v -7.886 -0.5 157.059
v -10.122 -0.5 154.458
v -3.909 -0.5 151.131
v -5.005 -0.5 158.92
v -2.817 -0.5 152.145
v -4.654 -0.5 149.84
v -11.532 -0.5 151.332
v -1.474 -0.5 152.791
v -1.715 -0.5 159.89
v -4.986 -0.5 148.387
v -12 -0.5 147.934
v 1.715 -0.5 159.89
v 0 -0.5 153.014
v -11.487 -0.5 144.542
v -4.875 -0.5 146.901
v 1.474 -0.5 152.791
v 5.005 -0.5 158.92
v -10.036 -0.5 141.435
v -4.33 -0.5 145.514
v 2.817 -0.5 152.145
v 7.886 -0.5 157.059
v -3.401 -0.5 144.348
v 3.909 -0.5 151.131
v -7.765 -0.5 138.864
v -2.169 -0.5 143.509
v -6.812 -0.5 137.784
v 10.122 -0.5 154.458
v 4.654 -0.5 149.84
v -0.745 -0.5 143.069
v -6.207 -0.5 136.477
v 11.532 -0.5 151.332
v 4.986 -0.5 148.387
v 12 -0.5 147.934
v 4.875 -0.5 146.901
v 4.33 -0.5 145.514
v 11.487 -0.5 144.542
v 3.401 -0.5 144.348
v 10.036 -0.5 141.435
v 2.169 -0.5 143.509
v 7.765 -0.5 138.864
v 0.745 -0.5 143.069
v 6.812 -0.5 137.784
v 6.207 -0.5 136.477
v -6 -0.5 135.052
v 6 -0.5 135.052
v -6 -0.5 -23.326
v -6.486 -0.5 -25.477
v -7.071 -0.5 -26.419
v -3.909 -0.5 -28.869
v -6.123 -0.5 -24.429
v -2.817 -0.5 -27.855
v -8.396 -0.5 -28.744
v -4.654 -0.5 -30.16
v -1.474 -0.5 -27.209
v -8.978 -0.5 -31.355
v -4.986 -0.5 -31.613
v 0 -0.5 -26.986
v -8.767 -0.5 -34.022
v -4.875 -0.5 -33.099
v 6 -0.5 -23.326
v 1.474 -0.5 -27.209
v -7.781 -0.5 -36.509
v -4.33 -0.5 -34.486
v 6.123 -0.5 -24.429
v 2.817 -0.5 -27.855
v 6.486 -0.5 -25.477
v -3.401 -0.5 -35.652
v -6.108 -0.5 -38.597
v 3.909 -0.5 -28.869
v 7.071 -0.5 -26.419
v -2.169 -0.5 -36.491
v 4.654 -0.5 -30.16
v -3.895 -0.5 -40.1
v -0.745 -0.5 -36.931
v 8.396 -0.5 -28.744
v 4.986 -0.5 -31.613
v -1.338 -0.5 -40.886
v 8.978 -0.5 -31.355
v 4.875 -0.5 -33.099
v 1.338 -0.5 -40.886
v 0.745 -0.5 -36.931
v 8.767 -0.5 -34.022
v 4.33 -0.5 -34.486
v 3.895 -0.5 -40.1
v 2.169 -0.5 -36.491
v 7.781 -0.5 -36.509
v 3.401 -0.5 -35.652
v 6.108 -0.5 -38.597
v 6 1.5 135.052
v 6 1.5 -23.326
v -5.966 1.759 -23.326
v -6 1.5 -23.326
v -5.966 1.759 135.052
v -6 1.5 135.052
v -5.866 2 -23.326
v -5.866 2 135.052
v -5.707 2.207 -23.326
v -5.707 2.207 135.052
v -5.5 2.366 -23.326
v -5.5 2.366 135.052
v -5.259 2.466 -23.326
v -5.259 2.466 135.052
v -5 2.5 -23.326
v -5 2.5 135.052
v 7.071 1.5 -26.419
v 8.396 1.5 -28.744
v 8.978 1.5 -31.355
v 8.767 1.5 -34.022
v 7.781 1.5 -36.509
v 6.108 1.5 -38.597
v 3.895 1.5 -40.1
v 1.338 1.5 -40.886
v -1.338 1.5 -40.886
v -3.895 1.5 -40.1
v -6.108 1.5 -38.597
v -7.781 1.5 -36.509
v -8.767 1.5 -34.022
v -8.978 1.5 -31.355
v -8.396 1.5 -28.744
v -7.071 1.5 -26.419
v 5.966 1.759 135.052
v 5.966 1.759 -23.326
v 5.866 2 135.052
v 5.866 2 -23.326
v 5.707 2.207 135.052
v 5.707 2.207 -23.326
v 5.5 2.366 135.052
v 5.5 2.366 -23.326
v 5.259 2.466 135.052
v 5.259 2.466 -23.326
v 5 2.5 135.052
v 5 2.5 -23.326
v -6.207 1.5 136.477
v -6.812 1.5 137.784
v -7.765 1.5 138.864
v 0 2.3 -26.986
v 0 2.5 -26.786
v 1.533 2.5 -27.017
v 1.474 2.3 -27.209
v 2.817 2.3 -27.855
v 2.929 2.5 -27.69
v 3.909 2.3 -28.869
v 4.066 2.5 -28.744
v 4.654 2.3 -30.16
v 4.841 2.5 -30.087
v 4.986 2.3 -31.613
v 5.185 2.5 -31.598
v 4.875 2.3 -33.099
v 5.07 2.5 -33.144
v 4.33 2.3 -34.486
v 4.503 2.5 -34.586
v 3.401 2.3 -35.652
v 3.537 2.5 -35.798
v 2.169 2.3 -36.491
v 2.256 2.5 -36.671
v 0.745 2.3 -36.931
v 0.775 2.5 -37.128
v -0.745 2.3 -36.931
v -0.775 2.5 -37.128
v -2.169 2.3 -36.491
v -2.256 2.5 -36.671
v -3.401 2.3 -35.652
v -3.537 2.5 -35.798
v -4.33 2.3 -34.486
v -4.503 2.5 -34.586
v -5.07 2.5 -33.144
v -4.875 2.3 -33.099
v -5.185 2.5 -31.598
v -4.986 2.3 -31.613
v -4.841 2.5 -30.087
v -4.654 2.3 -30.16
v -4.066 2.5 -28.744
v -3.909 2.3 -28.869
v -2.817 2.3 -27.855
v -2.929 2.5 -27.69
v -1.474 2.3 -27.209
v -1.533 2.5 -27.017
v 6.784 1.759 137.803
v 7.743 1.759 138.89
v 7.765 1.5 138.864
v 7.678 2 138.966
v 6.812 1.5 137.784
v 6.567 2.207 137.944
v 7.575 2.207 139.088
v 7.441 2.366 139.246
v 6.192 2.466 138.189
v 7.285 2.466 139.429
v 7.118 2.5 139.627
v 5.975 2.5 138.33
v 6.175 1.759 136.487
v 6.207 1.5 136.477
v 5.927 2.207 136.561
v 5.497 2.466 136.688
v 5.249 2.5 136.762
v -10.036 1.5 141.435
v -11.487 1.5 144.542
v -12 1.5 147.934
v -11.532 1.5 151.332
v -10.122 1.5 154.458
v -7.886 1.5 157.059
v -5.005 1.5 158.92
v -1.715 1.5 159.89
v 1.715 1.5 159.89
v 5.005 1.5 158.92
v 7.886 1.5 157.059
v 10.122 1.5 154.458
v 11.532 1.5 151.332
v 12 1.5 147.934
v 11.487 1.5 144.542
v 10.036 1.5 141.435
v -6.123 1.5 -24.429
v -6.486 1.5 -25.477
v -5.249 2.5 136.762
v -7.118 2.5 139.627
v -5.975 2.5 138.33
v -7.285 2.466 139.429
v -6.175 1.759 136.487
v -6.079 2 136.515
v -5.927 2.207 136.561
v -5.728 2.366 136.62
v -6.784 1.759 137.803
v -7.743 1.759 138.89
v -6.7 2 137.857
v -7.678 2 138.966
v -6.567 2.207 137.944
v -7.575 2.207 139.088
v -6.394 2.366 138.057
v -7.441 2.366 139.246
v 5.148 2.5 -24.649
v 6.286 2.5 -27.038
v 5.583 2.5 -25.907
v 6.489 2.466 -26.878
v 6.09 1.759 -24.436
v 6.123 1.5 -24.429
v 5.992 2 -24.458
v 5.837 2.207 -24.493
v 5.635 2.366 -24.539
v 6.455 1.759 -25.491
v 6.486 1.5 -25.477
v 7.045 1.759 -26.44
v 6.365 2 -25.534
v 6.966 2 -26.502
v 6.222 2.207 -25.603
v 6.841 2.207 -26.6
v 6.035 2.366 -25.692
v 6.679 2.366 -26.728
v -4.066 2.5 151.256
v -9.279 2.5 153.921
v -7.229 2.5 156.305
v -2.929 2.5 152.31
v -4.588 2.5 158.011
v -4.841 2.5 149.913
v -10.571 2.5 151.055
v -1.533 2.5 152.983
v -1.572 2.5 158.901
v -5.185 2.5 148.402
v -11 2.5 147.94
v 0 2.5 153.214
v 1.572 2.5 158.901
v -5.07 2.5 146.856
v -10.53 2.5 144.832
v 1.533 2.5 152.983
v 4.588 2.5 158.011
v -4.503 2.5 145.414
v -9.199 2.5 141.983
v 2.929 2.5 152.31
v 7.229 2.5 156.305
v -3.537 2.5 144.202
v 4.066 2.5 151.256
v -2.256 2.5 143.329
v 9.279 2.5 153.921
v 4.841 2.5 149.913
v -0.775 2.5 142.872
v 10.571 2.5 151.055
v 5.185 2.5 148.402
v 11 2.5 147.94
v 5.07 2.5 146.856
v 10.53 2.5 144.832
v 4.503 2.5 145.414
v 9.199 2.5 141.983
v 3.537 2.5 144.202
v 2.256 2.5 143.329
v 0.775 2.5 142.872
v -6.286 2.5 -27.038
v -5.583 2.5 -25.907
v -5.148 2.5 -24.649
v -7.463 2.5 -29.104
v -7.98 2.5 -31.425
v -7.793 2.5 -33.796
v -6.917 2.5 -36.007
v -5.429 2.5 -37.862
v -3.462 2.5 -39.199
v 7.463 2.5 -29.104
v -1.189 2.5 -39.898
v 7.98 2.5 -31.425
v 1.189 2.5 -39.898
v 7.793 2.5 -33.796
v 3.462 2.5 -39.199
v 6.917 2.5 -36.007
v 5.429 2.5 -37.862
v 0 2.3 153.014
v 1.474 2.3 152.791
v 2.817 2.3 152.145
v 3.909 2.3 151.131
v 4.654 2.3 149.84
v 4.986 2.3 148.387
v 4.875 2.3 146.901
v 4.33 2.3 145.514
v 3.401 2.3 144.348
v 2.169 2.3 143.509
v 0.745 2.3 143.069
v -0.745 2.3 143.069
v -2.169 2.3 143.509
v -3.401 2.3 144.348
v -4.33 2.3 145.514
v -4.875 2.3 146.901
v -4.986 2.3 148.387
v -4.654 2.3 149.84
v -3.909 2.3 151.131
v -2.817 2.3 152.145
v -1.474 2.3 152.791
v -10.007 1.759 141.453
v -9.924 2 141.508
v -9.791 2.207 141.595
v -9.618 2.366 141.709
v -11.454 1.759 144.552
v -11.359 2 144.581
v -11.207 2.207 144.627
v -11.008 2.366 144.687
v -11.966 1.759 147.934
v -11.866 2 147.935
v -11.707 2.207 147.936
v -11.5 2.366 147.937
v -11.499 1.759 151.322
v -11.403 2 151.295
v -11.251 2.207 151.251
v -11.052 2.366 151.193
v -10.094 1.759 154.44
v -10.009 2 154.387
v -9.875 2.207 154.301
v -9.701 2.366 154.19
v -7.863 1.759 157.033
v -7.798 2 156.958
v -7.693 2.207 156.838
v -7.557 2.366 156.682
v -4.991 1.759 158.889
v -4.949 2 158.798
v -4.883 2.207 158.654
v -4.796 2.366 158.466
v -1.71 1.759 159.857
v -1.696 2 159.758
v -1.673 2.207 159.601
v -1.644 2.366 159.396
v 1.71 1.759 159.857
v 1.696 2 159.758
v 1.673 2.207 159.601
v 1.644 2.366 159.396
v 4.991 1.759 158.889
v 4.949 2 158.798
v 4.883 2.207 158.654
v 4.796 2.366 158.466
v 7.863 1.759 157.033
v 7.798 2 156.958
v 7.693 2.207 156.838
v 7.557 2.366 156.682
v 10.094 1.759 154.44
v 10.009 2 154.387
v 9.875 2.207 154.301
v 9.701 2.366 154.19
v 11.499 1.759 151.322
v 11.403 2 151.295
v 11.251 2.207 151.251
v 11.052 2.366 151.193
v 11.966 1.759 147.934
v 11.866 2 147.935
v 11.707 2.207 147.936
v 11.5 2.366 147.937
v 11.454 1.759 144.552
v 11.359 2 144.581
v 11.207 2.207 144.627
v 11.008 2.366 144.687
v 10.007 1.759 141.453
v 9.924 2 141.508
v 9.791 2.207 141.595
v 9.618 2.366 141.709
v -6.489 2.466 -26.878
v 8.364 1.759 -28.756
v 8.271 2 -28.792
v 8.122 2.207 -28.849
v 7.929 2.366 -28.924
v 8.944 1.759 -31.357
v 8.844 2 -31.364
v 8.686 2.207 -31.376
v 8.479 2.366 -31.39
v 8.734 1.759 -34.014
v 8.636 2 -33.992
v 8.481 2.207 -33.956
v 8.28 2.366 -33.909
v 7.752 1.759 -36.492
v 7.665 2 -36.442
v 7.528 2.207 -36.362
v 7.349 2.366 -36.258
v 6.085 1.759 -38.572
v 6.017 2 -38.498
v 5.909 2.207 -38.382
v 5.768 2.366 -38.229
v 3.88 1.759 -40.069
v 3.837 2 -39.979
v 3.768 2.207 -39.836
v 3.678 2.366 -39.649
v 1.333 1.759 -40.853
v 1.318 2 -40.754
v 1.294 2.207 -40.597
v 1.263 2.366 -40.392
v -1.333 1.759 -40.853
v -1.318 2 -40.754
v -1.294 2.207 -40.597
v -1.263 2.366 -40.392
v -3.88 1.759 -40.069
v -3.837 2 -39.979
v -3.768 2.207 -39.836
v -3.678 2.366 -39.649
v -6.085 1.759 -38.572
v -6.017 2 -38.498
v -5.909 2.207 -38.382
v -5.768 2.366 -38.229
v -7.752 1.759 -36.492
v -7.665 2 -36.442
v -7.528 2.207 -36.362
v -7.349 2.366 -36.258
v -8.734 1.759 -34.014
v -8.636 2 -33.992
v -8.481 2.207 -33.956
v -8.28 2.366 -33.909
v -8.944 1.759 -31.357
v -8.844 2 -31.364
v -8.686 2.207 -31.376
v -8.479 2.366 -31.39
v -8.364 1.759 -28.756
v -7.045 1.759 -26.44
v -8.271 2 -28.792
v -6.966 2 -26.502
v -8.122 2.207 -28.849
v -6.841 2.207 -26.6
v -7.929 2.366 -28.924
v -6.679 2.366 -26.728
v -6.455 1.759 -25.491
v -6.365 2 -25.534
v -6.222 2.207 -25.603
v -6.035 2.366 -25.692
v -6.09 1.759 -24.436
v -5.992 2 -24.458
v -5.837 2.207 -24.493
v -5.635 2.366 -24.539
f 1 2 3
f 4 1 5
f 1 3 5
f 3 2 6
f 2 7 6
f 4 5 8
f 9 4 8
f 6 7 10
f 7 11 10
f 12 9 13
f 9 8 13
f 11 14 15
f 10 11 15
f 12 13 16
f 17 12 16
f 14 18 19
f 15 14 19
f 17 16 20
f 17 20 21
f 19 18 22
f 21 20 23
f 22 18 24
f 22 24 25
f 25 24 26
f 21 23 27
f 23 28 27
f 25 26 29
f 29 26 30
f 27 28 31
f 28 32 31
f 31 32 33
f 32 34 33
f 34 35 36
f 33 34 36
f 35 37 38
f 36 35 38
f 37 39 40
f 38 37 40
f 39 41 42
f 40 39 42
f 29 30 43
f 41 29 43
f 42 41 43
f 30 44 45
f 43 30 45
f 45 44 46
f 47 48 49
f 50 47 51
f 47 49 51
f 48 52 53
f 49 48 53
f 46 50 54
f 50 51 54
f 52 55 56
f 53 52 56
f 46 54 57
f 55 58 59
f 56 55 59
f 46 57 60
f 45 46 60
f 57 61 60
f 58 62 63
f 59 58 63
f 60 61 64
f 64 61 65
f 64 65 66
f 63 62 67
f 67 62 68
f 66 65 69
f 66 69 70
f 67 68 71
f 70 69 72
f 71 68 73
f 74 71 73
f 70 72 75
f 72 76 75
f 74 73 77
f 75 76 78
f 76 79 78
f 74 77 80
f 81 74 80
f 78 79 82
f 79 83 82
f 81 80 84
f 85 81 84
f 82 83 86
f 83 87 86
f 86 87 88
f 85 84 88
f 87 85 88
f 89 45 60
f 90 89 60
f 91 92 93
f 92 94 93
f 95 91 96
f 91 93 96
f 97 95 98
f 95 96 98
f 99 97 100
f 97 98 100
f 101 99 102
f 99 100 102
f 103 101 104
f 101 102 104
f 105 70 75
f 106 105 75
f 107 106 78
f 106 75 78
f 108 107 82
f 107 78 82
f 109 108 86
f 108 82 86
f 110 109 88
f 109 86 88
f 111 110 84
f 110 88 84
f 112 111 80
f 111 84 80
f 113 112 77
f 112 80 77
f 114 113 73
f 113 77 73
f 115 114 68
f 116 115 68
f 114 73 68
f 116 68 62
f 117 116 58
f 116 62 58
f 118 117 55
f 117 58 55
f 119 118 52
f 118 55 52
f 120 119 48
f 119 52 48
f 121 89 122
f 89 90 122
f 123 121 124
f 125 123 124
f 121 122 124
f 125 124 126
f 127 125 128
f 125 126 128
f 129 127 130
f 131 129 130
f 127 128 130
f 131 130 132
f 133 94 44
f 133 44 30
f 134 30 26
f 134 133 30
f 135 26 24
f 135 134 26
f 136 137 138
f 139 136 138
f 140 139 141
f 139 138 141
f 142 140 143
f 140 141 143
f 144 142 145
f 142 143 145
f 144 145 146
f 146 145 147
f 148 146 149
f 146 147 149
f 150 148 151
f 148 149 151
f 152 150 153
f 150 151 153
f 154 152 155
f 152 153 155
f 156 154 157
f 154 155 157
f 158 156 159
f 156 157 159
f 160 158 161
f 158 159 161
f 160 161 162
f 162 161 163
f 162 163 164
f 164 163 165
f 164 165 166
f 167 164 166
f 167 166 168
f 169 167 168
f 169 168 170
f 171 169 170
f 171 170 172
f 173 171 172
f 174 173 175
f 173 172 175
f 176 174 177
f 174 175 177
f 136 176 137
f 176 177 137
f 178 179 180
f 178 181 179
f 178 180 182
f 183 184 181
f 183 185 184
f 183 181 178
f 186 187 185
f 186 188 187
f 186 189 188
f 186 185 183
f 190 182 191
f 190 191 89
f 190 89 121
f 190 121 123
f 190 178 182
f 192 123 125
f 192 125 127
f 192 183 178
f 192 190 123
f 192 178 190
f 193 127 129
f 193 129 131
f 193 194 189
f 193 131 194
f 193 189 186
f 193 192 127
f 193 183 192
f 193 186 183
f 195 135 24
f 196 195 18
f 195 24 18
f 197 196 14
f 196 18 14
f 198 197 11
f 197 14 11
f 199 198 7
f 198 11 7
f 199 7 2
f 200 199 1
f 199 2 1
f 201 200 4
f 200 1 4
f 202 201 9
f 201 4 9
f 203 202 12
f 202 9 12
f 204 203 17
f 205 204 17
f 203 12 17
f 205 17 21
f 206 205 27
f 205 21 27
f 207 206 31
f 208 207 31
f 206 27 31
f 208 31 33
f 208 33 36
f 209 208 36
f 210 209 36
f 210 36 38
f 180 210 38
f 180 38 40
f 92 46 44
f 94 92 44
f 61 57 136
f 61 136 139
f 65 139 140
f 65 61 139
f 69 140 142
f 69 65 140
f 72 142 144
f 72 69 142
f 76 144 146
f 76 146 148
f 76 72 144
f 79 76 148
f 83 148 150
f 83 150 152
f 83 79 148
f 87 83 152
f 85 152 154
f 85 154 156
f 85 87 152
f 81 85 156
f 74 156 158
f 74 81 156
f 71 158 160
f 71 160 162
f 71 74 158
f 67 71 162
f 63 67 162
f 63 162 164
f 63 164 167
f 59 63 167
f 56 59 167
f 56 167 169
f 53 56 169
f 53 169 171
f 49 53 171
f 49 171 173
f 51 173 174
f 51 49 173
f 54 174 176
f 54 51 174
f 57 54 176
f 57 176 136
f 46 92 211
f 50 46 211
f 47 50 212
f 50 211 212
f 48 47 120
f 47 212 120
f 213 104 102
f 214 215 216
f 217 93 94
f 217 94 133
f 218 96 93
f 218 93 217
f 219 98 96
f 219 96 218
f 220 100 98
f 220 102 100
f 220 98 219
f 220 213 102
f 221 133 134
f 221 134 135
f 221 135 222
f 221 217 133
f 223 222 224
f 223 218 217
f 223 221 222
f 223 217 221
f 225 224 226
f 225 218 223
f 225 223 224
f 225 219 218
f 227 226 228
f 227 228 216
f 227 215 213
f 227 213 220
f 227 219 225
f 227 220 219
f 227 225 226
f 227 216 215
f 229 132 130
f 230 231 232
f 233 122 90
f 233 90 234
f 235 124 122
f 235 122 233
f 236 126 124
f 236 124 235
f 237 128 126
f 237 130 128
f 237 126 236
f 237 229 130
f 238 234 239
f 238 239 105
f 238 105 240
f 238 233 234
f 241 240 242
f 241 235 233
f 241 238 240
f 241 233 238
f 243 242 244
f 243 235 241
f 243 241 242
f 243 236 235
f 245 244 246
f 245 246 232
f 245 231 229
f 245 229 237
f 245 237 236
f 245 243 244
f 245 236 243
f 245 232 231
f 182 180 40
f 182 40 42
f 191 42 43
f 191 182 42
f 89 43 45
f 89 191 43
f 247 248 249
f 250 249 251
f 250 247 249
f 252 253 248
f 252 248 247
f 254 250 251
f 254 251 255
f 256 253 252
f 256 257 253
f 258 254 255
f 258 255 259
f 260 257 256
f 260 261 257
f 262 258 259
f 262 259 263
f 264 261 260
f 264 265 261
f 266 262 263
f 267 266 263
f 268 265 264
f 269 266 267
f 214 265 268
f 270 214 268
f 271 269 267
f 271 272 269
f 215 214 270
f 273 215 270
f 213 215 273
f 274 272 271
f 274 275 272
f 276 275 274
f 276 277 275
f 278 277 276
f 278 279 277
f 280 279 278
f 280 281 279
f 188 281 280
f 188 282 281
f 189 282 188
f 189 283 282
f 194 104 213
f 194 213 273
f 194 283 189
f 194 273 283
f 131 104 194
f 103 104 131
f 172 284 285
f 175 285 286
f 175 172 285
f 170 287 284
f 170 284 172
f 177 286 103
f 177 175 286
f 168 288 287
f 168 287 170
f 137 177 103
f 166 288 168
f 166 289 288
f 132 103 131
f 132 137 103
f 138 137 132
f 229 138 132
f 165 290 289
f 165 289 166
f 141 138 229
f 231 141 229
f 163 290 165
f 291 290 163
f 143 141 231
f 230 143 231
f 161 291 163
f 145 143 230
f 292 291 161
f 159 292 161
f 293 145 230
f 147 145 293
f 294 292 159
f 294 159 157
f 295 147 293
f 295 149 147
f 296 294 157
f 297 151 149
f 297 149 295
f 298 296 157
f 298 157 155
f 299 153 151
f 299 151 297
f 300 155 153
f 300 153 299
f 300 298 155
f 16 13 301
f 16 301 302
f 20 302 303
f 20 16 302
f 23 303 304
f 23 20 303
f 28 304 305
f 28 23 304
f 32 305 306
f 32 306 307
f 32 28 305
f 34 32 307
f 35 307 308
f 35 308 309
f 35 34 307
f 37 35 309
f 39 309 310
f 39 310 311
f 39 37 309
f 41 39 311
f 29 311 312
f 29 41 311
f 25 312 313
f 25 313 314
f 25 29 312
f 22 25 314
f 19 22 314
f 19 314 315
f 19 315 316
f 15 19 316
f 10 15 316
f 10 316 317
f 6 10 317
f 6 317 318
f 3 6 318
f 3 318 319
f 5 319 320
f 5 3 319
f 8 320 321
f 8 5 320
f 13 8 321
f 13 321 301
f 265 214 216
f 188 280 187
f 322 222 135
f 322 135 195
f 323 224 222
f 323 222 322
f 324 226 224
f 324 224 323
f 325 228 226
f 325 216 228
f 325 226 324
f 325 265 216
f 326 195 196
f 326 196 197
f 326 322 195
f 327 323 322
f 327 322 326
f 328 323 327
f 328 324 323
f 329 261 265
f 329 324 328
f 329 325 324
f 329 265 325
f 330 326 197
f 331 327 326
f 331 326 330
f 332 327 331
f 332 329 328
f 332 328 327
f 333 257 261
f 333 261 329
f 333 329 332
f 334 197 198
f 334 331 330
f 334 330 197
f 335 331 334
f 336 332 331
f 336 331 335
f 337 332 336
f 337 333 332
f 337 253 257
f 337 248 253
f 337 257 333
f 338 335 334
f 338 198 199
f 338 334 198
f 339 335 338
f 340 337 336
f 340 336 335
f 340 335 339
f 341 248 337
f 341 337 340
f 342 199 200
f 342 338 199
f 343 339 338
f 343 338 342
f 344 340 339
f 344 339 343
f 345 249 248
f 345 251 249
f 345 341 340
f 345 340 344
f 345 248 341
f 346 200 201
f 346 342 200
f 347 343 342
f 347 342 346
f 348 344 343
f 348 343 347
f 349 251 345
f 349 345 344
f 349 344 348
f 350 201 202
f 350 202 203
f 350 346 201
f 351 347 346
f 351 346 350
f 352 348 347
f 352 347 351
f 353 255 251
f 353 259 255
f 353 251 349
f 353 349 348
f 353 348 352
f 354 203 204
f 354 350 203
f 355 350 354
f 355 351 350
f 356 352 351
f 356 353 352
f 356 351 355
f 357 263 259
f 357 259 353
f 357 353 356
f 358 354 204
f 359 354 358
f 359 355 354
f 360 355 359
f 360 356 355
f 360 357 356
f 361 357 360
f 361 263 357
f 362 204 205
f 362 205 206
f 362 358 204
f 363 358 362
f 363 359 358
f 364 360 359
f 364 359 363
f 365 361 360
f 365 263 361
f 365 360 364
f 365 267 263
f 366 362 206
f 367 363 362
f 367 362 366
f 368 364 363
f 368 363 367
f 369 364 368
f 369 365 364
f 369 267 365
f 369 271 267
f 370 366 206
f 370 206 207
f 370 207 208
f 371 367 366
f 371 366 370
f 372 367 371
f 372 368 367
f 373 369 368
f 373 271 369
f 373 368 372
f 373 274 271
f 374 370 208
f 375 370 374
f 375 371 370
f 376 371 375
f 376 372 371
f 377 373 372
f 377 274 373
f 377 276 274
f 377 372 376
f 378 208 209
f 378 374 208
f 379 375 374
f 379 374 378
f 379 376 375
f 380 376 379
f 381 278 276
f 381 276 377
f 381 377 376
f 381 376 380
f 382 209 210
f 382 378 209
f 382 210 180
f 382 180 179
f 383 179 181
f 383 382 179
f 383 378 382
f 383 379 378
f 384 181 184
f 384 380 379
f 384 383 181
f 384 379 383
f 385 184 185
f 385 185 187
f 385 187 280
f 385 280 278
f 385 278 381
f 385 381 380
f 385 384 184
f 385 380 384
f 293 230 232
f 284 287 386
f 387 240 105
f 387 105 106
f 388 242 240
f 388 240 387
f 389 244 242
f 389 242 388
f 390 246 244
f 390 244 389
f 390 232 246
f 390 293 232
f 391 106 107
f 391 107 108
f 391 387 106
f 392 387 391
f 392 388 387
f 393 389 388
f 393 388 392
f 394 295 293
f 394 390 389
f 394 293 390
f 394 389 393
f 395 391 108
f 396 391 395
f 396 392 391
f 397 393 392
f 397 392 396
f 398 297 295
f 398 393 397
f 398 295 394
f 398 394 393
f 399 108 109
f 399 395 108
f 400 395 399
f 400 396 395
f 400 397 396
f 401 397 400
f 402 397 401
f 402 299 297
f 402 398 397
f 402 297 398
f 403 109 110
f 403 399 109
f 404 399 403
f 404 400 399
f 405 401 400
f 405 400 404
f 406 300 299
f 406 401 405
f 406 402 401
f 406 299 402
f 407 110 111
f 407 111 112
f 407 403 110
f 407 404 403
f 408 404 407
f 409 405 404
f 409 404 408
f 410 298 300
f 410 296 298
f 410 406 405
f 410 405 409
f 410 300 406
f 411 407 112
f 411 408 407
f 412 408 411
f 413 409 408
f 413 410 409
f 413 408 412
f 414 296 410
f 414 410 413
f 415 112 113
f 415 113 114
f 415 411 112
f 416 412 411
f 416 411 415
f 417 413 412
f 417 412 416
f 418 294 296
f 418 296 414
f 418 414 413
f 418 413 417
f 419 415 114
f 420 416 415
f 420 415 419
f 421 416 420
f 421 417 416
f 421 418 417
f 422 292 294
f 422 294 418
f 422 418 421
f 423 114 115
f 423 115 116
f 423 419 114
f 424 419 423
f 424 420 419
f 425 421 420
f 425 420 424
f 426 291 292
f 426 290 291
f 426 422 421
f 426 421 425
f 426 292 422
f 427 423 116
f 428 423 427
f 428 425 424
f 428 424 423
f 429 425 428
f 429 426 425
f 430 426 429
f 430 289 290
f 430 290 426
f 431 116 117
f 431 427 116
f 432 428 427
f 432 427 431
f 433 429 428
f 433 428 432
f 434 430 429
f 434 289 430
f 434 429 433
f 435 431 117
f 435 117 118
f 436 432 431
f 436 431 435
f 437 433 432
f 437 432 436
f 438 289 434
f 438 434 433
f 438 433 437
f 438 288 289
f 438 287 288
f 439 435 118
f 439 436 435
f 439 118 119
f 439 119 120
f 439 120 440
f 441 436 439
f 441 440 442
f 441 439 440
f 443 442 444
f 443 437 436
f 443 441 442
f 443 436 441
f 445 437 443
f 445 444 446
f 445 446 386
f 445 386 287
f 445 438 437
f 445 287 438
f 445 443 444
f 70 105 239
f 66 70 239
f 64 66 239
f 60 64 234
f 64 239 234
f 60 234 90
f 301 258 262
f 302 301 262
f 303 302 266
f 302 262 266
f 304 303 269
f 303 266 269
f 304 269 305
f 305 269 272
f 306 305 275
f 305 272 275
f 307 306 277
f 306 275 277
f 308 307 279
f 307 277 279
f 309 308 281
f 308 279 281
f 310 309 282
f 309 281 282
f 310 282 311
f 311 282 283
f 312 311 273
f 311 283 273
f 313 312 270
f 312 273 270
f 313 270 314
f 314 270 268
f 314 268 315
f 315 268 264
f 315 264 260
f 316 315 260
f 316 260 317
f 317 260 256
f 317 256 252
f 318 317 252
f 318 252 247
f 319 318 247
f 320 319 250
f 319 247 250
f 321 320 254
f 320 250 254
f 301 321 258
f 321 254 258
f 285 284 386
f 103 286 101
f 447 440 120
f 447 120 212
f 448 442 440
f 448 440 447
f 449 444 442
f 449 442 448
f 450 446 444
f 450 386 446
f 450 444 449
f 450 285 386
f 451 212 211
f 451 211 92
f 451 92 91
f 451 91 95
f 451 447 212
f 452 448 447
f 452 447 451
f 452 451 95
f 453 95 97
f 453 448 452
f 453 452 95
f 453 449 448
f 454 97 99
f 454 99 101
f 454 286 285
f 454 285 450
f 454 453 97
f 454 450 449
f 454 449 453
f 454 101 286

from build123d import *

# Parameters (mm, degrees)
SKETCH_1_R      = 3.333333333
EXTRUDE_1_DEPTH = 2
SCALE_1_SCALE   = 1.5
CHAMFER_1_SIZE  = 0.2
FILLET_1_R      = 5
FILLET_2_R      = 1


with BuildPart() as part:
    # 草图1 → 凸台-拉伸1 (new body)
    with BuildSketch(Plane(origin=(0, 0, 0), x_dir=(1, 0, 0), z_dir=(0, 1, 0))):
        with BuildLine():
            Line((-4, -4.472135955), (-4, -113.07179677))
            ThreePointArc((-4, -113.07179677), (0, -128), (4, -113.07179677))
            Line((4, -113.07179677), (4, -4.472135955))
            ThreePointArc((4, -4.472135955), (0, 6), (-4, -4.472135955))
        make_face()
        with Locations(Location((0, 0, 0), (0, 0, 270))):
            Circle(SKETCH_1_R, mode=Mode.SUBTRACT)
        with Locations(Location((0, -120, 0), (0, 0, 270))):
            Circle(SKETCH_1_R, mode=Mode.SUBTRACT)
    extrude(amount=EXTRUDE_1_DEPTH)


with BuildPart() as part_1:
    # 缩放比例1: scaled about (0, 1, 63.97284267)
    add(part.part.scale(SCALE_1_SCALE).moved(Location((0, -0.5, -31.986421335))))

    # 倒角1
    chamfer_1_edges = [part_1.edges().sort_by_distance(p)[0] for p in [
        (0, 2.5, -36.986421335),
        (0, 2.5, 143.013578665),
    ]]
    chamfer(chamfer_1_edges, length=CHAMFER_1_SIZE)

    # 圆角1
    fillet_1_edges = [part_1.edges().sort_by_distance(p)[0] for p in [
        (6, 1, -25.278217403),
        (6, 1, 137.62127382),
        (-6, 1, 137.62127382),
        (-6, 1, -25.278217403),
    ]]
    fillet(fillet_1_edges, radius=FILLET_1_R)

    # 圆角2
    fillet_2_edges = [part_1.edges().sort_by_distance(p)[0] for p in [
        (6, 2.5, 55.862964986),
        (0, 2.5, 160.013578665),
        (-6, 2.5, 55.862964986),
        (0, 2.5, -40.986421335),
        (6.462573935, 2.5, 137.152517394),
        (-6.462573935, 2.5, 137.152517394),
        (-6.275444087, 2.5, -24.962801474),
        (6.275444087, 2.5, -24.962801474),
    ]]
    fillet(fillet_2_edges, radius=FILLET_2_R)


solid = part_1.part
